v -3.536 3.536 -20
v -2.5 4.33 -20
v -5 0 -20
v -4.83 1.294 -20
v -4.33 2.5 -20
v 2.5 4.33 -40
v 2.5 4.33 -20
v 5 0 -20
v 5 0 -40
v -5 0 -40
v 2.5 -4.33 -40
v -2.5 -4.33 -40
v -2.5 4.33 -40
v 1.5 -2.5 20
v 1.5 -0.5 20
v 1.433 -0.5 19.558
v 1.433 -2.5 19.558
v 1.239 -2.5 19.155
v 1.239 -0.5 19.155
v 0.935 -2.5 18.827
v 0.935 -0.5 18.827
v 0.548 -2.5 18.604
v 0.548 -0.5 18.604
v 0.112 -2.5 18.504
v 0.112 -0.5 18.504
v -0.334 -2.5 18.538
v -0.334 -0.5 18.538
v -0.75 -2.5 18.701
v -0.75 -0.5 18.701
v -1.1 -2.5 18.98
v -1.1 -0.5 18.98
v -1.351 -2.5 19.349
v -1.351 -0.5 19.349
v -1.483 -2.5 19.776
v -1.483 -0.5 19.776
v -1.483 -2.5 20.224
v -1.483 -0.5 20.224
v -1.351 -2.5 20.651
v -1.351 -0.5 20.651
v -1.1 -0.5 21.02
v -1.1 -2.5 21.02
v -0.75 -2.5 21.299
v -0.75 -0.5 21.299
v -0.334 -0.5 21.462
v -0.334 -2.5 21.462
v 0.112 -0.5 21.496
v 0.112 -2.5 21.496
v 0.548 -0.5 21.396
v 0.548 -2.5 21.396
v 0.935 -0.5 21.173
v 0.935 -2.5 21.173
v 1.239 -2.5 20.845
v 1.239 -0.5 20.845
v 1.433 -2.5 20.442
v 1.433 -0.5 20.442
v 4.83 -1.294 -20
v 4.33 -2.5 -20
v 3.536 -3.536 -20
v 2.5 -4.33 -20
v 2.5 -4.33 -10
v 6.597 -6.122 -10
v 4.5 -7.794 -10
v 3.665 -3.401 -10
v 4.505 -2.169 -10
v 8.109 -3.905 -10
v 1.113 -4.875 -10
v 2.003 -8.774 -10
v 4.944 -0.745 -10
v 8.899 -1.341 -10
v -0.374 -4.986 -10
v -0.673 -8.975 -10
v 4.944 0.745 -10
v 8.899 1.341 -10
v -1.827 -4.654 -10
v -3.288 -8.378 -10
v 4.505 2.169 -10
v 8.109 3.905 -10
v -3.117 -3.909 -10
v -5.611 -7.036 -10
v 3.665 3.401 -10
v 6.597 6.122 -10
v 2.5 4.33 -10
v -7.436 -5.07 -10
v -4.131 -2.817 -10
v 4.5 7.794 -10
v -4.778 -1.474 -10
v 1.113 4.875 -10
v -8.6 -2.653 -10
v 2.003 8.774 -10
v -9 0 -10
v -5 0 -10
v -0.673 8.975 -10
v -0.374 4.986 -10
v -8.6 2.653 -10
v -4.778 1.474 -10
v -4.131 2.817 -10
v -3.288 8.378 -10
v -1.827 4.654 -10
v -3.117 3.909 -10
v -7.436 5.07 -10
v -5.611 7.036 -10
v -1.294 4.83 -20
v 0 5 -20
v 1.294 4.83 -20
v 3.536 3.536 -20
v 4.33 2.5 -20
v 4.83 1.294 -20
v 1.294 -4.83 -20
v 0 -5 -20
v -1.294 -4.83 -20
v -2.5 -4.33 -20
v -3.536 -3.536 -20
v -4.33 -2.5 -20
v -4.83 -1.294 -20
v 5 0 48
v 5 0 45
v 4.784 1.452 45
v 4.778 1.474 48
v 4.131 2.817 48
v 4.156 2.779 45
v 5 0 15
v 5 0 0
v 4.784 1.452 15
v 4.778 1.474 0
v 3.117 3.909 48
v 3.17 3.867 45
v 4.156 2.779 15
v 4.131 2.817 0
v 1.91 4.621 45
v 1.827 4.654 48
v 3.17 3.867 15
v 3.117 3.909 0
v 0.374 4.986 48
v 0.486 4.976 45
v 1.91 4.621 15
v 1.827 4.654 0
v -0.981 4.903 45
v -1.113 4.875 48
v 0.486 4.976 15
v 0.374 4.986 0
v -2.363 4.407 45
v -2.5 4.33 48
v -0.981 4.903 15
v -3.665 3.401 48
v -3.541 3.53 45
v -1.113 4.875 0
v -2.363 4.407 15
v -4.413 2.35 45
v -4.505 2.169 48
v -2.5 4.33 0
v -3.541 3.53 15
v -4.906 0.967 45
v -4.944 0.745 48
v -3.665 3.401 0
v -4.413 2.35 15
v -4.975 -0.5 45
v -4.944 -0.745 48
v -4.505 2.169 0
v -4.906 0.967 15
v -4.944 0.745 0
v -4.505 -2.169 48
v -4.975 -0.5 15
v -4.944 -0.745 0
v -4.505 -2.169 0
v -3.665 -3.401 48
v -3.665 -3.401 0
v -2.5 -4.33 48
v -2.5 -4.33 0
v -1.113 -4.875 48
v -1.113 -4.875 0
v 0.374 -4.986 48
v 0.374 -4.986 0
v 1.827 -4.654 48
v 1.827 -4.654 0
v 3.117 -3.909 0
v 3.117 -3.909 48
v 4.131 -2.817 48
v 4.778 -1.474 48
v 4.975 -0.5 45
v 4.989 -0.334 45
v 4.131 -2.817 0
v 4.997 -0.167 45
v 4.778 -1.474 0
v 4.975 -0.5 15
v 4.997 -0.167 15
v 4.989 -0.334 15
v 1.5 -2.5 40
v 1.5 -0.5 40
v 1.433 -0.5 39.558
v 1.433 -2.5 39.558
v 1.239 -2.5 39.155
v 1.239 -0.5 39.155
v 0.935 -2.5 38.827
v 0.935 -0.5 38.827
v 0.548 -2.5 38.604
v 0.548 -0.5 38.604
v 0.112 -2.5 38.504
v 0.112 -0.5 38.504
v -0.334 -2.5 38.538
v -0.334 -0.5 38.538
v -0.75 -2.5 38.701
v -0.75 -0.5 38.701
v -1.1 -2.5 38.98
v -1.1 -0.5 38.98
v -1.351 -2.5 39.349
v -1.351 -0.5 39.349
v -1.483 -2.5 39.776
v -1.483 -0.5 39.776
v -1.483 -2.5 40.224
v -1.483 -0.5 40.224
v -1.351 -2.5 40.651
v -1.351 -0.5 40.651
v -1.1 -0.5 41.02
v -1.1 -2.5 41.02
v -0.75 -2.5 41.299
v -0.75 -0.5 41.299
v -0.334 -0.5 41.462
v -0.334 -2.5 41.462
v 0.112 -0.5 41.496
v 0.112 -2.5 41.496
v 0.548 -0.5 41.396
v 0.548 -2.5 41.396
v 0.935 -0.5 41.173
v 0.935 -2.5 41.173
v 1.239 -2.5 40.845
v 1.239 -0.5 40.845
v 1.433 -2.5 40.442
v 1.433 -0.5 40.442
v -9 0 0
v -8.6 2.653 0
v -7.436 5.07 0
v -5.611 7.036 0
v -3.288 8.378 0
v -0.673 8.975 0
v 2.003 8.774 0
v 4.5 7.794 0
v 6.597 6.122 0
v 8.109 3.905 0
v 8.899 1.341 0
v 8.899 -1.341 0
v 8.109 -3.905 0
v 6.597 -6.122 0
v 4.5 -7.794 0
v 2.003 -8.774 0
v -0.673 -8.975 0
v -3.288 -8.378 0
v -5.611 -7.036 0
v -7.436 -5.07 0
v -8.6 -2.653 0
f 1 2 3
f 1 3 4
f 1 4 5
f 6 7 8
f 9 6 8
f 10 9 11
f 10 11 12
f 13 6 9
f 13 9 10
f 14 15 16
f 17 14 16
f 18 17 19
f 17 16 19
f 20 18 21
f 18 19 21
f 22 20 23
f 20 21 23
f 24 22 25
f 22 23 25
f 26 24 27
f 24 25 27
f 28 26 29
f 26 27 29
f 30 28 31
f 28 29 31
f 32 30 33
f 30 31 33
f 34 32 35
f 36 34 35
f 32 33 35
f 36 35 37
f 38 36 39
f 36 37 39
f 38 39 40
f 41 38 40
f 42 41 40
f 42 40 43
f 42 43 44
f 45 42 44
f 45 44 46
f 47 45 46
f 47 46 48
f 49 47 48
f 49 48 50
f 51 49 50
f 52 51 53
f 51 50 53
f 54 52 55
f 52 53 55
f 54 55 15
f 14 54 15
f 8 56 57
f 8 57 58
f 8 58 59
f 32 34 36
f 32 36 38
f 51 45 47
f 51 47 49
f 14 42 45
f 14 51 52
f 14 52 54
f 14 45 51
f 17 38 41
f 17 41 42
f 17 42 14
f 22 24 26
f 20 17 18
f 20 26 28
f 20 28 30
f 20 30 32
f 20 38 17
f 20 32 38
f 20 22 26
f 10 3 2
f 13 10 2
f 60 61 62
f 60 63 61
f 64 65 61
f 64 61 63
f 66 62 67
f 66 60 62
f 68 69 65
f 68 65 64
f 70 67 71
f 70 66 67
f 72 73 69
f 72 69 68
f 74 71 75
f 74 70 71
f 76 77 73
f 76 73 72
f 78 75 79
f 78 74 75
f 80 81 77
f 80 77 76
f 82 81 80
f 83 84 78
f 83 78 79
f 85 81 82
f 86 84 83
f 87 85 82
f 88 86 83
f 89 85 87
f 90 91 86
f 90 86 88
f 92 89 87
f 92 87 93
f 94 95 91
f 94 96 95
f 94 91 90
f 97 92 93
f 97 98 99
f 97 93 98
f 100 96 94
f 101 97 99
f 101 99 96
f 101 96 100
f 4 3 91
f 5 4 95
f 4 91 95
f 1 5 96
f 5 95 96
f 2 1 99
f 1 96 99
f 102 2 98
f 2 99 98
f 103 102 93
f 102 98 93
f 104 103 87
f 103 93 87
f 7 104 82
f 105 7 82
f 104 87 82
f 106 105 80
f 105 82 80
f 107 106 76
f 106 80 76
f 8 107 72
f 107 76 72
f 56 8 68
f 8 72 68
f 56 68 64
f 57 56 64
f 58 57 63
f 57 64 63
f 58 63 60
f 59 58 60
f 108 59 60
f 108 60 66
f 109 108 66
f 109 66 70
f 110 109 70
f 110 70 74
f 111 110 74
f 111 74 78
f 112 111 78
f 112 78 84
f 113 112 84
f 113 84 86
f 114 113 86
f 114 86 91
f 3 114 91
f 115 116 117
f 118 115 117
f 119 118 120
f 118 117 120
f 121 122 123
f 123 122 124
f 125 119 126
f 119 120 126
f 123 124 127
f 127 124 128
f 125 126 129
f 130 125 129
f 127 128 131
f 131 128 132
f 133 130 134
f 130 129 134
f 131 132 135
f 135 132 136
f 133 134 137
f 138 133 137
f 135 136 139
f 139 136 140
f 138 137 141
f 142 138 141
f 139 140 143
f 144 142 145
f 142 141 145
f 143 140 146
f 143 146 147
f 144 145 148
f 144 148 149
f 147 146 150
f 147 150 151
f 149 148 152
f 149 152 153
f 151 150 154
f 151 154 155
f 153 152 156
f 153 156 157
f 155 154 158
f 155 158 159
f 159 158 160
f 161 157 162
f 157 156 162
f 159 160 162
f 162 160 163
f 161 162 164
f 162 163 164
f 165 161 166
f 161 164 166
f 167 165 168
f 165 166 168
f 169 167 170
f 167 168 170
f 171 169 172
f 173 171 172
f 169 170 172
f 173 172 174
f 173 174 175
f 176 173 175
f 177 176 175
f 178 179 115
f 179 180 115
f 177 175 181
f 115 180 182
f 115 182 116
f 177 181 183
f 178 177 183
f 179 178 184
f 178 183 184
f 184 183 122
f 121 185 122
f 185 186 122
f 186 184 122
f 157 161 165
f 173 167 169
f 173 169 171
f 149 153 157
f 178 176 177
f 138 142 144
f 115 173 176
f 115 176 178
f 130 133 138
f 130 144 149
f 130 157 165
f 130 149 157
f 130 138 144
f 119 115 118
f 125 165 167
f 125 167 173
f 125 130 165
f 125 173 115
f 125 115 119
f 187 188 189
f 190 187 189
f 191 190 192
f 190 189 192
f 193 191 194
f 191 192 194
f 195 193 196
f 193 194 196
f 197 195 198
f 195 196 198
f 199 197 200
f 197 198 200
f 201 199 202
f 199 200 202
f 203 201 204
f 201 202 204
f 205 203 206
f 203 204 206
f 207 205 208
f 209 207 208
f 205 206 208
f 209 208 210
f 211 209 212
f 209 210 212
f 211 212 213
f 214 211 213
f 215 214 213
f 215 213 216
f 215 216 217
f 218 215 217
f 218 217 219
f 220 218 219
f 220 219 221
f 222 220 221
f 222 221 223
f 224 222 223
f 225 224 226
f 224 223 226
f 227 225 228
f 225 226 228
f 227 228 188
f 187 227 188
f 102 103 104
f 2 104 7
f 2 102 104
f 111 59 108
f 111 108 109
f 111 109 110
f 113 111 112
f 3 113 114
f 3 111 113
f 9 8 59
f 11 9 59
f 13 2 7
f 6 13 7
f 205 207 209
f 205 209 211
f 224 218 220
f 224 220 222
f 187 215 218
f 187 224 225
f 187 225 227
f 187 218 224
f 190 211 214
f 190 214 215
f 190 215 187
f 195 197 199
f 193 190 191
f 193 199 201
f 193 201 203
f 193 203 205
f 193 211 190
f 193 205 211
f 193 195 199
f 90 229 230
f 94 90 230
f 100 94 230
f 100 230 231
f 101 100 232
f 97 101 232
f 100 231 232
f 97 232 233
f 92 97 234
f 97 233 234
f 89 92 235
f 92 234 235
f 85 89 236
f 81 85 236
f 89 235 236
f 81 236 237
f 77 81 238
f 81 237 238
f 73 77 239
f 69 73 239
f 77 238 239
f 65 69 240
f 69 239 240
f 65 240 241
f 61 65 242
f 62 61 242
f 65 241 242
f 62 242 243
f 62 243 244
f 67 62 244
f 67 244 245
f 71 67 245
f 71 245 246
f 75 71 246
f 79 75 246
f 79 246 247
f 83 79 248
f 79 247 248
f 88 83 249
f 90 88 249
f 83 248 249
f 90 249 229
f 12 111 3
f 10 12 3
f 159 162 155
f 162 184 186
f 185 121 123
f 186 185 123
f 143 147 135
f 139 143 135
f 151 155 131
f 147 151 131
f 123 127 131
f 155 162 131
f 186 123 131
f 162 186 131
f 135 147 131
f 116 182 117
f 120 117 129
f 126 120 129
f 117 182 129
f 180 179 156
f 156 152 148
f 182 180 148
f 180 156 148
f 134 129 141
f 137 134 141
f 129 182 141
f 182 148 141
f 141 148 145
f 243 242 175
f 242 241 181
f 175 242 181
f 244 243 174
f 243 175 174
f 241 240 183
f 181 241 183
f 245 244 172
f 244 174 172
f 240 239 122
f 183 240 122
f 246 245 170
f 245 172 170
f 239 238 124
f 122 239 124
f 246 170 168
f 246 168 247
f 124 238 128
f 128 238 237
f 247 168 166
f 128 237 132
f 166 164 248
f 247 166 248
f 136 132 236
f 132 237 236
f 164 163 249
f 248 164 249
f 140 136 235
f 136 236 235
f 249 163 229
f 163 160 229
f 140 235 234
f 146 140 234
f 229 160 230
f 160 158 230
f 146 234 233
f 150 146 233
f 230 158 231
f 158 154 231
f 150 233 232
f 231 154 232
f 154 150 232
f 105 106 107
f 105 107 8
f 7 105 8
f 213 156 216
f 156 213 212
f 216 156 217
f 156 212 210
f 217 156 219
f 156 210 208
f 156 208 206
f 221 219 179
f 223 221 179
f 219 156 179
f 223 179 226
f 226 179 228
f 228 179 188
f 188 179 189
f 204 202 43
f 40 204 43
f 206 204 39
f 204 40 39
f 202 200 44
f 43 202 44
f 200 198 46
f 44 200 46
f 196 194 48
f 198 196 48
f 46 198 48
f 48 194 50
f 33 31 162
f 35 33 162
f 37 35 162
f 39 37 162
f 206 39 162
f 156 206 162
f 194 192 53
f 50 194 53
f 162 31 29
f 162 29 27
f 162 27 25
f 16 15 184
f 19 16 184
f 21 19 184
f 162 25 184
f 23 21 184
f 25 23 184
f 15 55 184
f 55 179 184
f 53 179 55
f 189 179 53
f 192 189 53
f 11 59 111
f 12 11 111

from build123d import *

# Parameters (mm, degrees)
SKETCH1_R               = 5
BOSS_EXTRUDE1_DEPTH     = 40
SKETCH2_R               = 9
BOSS_EXTRUDE2_DEPTH     = 10
SKETCH3_R               = 5
BOSS_EXTRUDE3_DEPTH     = 10
BOSS_EXTRUDE4_DEPTH     = 20
SKETCH6_R               = 5
BOSS_EXTRUDE5_DEPTH     = 8
SKETCH5_W               = 30
SKETCH5_H               = 5.5
CUT_EXTRUDE1_DEPTH      = 10
CUT_EXTRUDE1_DEPTH_BACK = 10
SKETCH8_R               = 1.5
CUT_EXTRUDE2_DEPTH      = 2


with BuildPart() as part:
    # Sketch1 → Boss-Extrude1 (new body)
    with BuildSketch(Plane.XY):
        Circle(SKETCH1_R)
    extrude(amount=BOSS_EXTRUDE1_DEPTH)

    # Sketch2 → Boss-Extrude2 (add)
    with BuildSketch(Plane(origin=(0, 0, 0), x_dir=(-1, 0, 0), z_dir=(0, 0, -1))):
        Circle(SKETCH2_R)
    extrude(amount=BOSS_EXTRUDE2_DEPTH)

    # Sketch3 → Boss-Extrude3 (add)
    with BuildSketch(Plane(origin=(0, 0, -10), x_dir=(-1, 0, 0), z_dir=(0, 0, -1))):
        Circle(SKETCH3_R)
    extrude(amount=BOSS_EXTRUDE3_DEPTH)

    # Sketch4 → Boss-Extrude4 (add)
    with BuildSketch(Plane(origin=(0, 0, -20), x_dir=(-1, 0, 0), z_dir=(0, 0, -1))):
        Polygon((-5, 0), (-2.5, -4.330127019), (2.5, -4.330127019), (5, 0), (2.5, 4.330127019), (-2.5, 4.330127019), align=None)
    extrude(amount=BOSS_EXTRUDE4_DEPTH)

    # Sketch6 → Boss-Extrude5 (add)
    with BuildSketch(Plane.XY.offset(40)):
        Circle(SKETCH6_R)
    extrude(amount=BOSS_EXTRUDE5_DEPTH)

    # Sketch5 → Cut-Extrude1 (cut, two sides)
    with BuildSketch(Plane(origin=(0, 0, 0), x_dir=(0, 0, -1), z_dir=(1, 0, 0))) as cut_extrude1_sk:
        with Locations((-30, 2.25)):
            Rectangle(SKETCH5_W, SKETCH5_H)
    extrude(amount=CUT_EXTRUDE1_DEPTH, mode=Mode.SUBTRACT)
    extrude(cut_extrude1_sk.sketch, amount=-CUT_EXTRUDE1_DEPTH_BACK, mode=Mode.SUBTRACT)

    # Sketch8 → Cut-Extrude2 (cut)
    with BuildSketch(Plane(origin=(0, -0.5, 0), x_dir=(1, 0, 0), z_dir=(0, 1, 0))):
        with Locations((0, -40)):
            Circle(SKETCH8_R)
        with Locations((0, -20)):
            Circle(SKETCH8_R)
    extrude(amount=-CUT_EXTRUDE2_DEPTH, mode=Mode.SUBTRACT)


solid = part.part
